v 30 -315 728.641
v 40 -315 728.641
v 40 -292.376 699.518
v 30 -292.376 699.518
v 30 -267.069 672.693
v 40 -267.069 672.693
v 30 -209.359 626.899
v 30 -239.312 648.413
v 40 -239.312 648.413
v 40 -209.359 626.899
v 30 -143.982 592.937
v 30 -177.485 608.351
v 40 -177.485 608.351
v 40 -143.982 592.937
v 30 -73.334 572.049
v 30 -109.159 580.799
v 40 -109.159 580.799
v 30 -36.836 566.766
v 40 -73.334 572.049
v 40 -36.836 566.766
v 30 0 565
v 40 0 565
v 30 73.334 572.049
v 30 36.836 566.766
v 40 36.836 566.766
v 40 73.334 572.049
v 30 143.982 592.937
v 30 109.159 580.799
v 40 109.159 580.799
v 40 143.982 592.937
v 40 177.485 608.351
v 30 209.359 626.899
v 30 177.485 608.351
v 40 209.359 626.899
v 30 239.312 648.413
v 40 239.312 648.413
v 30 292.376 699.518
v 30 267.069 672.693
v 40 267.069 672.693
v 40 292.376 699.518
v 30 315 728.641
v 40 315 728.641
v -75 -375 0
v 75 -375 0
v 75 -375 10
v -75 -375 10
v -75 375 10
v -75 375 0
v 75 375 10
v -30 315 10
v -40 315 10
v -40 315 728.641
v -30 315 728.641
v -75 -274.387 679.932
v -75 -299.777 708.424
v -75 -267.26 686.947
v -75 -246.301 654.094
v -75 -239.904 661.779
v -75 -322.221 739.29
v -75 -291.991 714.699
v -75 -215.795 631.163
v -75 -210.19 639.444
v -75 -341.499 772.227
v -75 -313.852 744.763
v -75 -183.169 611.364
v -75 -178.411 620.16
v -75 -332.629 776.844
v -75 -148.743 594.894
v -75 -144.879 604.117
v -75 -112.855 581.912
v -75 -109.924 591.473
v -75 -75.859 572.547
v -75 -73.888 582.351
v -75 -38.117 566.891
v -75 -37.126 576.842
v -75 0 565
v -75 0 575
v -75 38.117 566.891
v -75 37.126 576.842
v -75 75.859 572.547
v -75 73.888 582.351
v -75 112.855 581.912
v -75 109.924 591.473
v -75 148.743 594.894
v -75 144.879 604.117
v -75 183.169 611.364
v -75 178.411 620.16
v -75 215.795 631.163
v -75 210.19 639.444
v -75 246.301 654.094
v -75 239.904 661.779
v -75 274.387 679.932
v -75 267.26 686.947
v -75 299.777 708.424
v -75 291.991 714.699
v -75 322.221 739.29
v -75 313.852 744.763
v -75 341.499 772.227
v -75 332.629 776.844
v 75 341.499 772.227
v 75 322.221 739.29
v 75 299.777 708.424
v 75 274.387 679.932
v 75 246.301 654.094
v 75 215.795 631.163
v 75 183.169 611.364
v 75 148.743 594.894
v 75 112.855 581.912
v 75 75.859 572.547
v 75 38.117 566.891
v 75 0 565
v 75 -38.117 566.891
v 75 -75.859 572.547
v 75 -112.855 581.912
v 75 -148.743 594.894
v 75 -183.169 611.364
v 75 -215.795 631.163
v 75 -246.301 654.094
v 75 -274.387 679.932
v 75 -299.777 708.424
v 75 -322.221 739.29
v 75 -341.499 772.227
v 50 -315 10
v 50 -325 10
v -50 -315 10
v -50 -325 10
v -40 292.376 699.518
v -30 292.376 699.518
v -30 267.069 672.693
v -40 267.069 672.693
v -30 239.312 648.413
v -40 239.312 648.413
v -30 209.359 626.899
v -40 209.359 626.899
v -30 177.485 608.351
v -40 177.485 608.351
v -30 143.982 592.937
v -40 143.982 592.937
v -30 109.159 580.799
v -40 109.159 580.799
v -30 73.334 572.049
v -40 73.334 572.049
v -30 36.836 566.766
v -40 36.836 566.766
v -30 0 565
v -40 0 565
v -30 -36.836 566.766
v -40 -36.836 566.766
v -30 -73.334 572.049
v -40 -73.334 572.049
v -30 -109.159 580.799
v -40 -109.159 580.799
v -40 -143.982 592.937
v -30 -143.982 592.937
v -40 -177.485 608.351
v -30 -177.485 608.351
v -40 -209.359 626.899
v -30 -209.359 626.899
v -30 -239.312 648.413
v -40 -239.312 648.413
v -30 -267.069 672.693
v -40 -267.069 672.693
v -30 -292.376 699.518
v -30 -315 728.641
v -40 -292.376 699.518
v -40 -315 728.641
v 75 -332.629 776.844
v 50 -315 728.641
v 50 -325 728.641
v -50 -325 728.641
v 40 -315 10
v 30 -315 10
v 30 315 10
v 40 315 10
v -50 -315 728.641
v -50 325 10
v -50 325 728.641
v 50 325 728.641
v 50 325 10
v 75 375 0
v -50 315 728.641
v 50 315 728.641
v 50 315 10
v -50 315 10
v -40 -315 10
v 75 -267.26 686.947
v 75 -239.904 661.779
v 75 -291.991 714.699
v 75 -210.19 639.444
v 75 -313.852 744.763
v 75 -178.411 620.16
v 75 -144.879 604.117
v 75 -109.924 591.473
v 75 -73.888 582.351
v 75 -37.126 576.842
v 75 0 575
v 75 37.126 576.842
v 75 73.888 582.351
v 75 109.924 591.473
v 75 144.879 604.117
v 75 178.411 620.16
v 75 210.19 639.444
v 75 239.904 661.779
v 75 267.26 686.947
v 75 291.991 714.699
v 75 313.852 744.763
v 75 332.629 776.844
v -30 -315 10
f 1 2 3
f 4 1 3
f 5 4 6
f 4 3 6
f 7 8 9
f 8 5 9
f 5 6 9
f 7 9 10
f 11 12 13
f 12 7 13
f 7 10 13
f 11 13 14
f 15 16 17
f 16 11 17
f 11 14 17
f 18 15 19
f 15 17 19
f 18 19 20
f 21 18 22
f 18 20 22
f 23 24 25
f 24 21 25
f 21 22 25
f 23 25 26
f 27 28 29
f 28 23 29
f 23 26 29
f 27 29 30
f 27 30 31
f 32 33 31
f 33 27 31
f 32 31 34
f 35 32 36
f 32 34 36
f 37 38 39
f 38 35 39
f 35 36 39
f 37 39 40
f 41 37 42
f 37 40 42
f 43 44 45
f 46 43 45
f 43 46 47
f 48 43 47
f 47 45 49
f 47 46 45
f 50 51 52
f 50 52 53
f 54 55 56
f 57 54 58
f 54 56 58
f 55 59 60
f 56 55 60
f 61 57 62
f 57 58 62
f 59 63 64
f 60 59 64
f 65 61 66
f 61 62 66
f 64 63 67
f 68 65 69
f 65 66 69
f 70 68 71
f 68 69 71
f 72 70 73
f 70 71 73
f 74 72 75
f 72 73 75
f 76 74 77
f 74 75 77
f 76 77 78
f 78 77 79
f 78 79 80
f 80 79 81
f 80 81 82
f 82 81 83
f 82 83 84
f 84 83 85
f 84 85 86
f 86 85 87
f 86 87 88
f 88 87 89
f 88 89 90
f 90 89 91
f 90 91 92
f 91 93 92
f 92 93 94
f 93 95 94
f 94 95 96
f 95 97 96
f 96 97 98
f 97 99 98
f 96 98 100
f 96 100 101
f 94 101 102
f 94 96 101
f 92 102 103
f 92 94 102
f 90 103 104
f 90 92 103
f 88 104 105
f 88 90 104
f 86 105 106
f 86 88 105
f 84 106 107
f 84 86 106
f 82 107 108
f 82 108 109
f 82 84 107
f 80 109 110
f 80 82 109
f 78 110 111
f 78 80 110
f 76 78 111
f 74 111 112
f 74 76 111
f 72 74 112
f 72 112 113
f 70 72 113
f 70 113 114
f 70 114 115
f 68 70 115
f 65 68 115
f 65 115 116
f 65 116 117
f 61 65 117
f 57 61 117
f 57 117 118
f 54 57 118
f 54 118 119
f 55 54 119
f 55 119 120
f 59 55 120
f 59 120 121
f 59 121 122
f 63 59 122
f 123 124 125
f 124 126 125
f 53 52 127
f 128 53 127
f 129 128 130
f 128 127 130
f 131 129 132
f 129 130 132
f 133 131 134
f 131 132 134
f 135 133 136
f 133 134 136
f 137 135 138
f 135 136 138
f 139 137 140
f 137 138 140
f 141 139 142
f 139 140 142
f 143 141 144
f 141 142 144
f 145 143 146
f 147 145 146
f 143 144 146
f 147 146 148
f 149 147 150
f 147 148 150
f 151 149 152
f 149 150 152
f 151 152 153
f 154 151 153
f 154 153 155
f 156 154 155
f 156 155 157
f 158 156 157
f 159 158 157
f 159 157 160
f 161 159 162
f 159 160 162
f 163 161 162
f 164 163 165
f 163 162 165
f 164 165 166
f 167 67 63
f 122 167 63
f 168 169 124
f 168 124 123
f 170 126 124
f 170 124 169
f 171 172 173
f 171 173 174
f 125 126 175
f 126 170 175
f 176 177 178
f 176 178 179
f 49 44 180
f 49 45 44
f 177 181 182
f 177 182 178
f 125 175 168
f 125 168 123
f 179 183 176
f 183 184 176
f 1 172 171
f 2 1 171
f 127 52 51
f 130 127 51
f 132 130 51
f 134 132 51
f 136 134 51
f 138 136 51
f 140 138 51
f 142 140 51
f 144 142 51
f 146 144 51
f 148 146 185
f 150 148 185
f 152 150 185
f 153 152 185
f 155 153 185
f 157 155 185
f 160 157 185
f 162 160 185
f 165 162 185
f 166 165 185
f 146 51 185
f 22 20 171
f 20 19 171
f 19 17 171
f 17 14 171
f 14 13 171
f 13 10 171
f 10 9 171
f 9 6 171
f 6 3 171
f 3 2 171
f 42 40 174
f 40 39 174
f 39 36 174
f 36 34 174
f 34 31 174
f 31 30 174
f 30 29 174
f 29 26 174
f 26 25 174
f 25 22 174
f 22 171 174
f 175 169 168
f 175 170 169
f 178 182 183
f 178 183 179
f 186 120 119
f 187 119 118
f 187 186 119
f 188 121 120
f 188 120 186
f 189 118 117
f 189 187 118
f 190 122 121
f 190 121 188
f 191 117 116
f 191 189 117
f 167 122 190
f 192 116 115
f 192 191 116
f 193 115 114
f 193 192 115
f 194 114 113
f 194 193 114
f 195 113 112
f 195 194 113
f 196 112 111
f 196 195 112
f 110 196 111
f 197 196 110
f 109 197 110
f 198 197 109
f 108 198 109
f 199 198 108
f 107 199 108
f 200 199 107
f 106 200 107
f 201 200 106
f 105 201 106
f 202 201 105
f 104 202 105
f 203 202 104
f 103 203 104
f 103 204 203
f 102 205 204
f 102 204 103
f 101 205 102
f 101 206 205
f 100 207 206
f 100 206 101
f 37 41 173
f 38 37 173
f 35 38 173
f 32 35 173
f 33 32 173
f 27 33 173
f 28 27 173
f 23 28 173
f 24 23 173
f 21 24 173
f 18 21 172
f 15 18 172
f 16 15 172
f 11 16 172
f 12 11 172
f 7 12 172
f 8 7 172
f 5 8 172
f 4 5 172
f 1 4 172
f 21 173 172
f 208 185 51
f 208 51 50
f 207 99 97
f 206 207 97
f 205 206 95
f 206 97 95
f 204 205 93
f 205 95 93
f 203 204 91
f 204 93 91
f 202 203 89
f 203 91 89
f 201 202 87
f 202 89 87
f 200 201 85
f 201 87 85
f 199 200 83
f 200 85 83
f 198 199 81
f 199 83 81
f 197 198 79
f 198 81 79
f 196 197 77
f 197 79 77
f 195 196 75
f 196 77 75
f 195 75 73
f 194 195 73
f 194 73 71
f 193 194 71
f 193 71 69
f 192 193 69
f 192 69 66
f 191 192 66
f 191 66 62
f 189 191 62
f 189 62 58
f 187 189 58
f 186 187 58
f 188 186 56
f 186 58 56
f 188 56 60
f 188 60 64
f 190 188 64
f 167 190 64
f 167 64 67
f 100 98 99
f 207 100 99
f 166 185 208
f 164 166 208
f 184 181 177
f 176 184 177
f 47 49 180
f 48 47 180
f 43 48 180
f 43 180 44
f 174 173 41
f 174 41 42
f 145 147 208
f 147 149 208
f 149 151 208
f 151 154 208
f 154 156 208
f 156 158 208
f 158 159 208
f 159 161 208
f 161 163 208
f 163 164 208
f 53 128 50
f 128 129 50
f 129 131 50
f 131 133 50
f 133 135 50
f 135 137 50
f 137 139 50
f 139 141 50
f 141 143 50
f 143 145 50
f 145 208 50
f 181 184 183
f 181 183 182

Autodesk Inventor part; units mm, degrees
ref_plane "YZ Plane" through (0, 0, 0) normal (1, 0, 0) x (0, 1, 0)
ref_plane "XZ Plane" through (0, 0, 0) normal (0, 1, 0) x (-1, 0, 0)
ref_plane "XY Plane" through (0, 0, 0) normal (0, 0, 1) x (1, 0, 0)
sketch "Sketch1" plane through (0, 0, 0) normal (1, 0, 0) x (0, 1, 0)
  line L0 (375, 0) -> (-375, 0)
  line L1 (-375, 0) -> (-375, 10)
  line L2 (-375, 10) -> (375, 10)
  line L3 (375, 10) -> (375, 0)
  line L4 (325, 10) -> (315, 10)
  line L5 (315, 10) -> (315, 728.6406)
  line L6 (315, 728.6406) -> (325, 728.6406)
  line L7 (325, 728.6406) -> (325, 10)
  circle A0 centre (0, 950) radius 375
  circle A1 centre (0, 950) radius 385
  line L8 (341.4992, 772.2268) -> (332.6291, 776.8443)
  line L9 (-332.6291, 776.8443) -> (-341.4992, 772.2268)
  line L10 (0, 0) -> (0, 950)
  line L11 (-90, 10) -> (-90, 275)
  arc A2 (90, 275) -> (-90, 275) centre (0, 275) ccw
  line L12 (90, 275) -> (90, 10)
  line L13 (-100, 10) -> (-100, 275)
  arc A3 (100, 275) -> (-100, 275) centre (0, 275) ccw
  line L14 (100, 275) -> (100, 10)
  line L15 (-100, 10) -> (-90, 10)
  line L16 (90, 10) -> (100, 10)
  dimension "d0" = 750
  dimension "d1" = 10
  dimension "d2" = 750
  dimension "d3" = 950
  dimension "d4" = 10
  dimension "d5" = 10
  dimension "d6" = 50
  dimension "d7" = 125
  dimension "d18" = 10
  dimension "d19" = 265
  dimension "d20" = 100
extrude "Extrusion1" add sketch "Sketch1" along normal mid plane 150 contours L0 L10 L2 L3 | L0 L1 L2 L10
extrude "Extrusion2" add sketch "Sketch1" along normal mid plane 150 separate body contours A1 L10 A0 L8 | A1 L9 A0 L10
extrude "Extrusion3" add sketch "Sketch1" along normal mid plane 100 separate body contours L2 L5 L6 L7
mirror "Mirror1" about plane through (0, 0, 0) normal (0, 1, 0) bodies 3
sketch "Sketch2" plane through (-75, -375, 10) normal (0, 0, 1) x (1, 0, 0)
  line L0 (25, 60) -> (125, 60) projected
  line L1 (25, 690) -> (125, 690) projected
  line L2 (35, 60) -> (45, 60)
  line L3 (45, 60) -> (45, 690)
  line L4 (45, 690) -> (35, 690)
  line L5 (35, 690) -> (35, 60)
  point P0 (75, 375)
  dimension "d14" = 10
  dimension "d15" = 30
extrude "Extrusion4" add sketch "Sketch2" along normal up to next separate body
mirror "Mirror2" about plane through (0, 0, 0) normal (1, 0, 0) bodies 4
extrude "PipeCut" [suppressed]
extrude "PipeCutSup" [suppressed]
equation "\"d4\" = d1"
equation "\"d23\" = d12"
equation "\"d12\" = 100"
properties part number "Vessel Support C" material "Steel"
